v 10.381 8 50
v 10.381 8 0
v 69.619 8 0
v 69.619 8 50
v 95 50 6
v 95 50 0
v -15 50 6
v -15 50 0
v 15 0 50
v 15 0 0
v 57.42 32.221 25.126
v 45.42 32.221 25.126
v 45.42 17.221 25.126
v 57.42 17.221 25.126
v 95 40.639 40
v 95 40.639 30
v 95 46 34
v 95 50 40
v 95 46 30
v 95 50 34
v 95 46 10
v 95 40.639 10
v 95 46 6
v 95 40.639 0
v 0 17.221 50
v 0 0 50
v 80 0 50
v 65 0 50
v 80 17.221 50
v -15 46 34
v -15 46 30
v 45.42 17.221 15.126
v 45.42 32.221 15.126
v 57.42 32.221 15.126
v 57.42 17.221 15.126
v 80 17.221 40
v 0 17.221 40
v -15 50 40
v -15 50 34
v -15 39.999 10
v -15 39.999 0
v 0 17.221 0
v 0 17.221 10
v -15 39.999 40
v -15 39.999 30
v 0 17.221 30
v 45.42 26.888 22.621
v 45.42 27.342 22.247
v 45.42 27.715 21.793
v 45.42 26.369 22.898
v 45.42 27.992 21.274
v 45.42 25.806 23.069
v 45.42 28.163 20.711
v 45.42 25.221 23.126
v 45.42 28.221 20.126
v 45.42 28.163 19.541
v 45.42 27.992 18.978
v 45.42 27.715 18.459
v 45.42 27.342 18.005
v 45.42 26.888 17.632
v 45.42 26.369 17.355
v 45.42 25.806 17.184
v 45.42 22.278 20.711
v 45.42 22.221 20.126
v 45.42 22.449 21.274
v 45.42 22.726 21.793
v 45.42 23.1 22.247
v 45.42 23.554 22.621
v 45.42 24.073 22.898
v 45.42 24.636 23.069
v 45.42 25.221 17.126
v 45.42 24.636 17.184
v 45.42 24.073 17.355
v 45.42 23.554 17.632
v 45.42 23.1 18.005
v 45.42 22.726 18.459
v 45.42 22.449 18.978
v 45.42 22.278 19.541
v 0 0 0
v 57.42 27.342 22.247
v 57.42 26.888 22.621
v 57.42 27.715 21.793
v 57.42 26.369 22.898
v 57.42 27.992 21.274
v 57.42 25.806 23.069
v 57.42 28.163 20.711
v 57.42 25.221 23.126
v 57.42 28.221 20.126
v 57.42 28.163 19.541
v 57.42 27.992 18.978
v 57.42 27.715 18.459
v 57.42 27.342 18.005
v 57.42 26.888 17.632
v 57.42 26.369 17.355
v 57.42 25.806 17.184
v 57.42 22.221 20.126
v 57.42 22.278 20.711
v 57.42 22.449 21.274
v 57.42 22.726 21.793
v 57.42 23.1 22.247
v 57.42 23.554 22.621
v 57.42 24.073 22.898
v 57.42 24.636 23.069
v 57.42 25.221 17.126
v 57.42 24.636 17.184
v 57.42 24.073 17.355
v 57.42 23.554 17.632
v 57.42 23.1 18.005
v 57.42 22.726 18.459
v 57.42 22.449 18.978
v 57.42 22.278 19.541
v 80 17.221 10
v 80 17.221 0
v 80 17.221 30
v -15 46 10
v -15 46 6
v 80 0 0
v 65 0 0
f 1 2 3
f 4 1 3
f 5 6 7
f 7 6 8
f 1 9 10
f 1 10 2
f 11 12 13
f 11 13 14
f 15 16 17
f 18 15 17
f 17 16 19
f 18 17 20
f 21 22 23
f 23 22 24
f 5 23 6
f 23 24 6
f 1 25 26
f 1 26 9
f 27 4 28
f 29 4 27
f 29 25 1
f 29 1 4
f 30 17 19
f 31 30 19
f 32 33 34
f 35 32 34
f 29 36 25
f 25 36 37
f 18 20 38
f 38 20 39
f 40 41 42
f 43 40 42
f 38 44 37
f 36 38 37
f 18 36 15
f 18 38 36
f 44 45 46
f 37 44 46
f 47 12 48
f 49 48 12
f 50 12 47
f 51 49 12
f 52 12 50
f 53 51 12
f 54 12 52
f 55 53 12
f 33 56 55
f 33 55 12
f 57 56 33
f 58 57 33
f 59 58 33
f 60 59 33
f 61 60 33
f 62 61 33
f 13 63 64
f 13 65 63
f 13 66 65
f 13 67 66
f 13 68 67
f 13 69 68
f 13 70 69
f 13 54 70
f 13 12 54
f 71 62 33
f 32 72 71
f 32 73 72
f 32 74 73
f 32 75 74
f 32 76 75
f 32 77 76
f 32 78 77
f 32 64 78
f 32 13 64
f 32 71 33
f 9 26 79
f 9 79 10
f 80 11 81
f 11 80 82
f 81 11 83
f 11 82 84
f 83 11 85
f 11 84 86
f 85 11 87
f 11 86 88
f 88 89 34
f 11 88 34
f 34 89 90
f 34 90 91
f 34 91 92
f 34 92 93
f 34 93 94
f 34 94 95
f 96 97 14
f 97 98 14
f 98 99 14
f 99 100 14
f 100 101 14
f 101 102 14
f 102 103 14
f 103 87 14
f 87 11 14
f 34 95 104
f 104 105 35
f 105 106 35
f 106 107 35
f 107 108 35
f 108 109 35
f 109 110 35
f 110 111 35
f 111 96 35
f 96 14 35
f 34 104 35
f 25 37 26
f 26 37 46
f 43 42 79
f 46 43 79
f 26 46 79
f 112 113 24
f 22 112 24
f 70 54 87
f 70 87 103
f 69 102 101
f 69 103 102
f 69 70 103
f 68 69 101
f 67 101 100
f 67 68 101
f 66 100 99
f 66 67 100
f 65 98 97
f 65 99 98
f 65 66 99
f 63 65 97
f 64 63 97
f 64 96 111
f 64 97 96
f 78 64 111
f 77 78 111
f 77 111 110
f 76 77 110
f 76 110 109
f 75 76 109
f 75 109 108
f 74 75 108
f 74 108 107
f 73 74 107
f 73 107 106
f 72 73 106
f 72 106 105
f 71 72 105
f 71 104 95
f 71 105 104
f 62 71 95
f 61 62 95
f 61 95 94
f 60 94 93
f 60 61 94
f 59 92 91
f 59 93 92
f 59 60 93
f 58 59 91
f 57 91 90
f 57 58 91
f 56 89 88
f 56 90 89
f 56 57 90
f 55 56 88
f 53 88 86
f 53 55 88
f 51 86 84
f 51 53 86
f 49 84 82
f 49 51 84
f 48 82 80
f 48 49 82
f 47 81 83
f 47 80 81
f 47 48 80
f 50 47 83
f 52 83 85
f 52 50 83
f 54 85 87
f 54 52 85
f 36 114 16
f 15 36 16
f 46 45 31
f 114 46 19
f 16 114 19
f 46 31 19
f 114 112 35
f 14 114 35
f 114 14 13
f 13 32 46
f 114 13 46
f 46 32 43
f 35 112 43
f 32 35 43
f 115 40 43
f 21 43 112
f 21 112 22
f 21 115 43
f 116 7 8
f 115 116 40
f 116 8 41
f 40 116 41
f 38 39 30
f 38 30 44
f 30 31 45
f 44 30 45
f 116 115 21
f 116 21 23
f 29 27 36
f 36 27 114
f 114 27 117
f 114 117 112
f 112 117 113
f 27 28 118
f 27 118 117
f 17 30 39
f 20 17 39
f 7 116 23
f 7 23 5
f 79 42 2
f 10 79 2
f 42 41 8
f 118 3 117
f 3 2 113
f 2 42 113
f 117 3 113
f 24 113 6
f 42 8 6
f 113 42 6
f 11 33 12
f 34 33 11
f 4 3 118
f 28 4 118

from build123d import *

# Parameters (mm, degrees)
BOSS_EXTRUDE1_DEPTH     = 50
BOSS_EXTRUDE2_DEPTH     = 10
BOSS_EXTRUDE3_START     = 30
BOSS_EXTRUDE3_DEPTH     = 10
SKETCH3_W               = 12
SKETCH3_H               = 10
BOSS_EXTRUDE4_DEPTH     = 15
CUT_EXTRUDE1_DEPTH      = 119.427192823
CUT_EXTRUDE1_DEPTH_BACK = 119.427192823
SKETCH4_R               = 3
SKETCH4_W               = 28
SKETCH4_H               = 4


with BuildPart() as part:
    # Sketch1 → Boss-Extrude1 (new body)
    with BuildSketch(Plane.XY):
        Polygon((69.618802154, 8), (65, 0), (80, 0), (80, 17.220839506), (0, 17.220839506), (0, 0), (15, 0), (10.381197846, 8), align=None)
    extrude(amount=BOSS_EXTRUDE1_DEPTH)

    # Sketch2 → Boss-Extrude2 (add)
    with BuildSketch(Plane.XY):
        Polygon((0, 17.220839506), (80, 17.220839506), (95, 40.639434385), (95, 50), (-15, 50), (-15, 39.999070977), align=None)
    extrude(amount=BOSS_EXTRUDE2_DEPTH)

    # Sketch2<3> → Boss-Extrude3 (add)
    with BuildSketch(Plane.XY.offset(BOSS_EXTRUDE3_START)):
        Polygon((0, 17.220839506), (80, 17.220839506), (95, 40.639434385), (95, 50), (-15, 50), (-15, 39.999070977), align=None)
    extrude(amount=BOSS_EXTRUDE3_DEPTH)

    # Sketch3 → Boss-Extrude4 (add)
    with BuildSketch(Plane(origin=(0, 17.220839506, 0), x_dir=(1, 0, 0), z_dir=(0, 1, 0))):
        with Locations((51.419853225, -20.126174842)):
            Rectangle(SKETCH3_W, SKETCH3_H)
    extrude(amount=BOSS_EXTRUDE4_DEPTH)

    # Sketch4 → Cut-Extrude1 (cut, two sides: drawn at the far end of the back side and taken through both)
    with BuildSketch(Plane(origin=(0, 0, 0), x_dir=(0, 0, -1), z_dir=(1, 0, 0)).offset(-CUT_EXTRUDE1_DEPTH_BACK)):
        with Locations((-20.126174842, 25.220839506)):
            Circle(SKETCH4_R)
        with Locations((-20, 48)):
            Rectangle(SKETCH4_W, SKETCH4_H)
    extrude(amount=CUT_EXTRUDE1_DEPTH + CUT_EXTRUDE1_DEPTH_BACK, mode=Mode.SUBTRACT)


solid = part.part
